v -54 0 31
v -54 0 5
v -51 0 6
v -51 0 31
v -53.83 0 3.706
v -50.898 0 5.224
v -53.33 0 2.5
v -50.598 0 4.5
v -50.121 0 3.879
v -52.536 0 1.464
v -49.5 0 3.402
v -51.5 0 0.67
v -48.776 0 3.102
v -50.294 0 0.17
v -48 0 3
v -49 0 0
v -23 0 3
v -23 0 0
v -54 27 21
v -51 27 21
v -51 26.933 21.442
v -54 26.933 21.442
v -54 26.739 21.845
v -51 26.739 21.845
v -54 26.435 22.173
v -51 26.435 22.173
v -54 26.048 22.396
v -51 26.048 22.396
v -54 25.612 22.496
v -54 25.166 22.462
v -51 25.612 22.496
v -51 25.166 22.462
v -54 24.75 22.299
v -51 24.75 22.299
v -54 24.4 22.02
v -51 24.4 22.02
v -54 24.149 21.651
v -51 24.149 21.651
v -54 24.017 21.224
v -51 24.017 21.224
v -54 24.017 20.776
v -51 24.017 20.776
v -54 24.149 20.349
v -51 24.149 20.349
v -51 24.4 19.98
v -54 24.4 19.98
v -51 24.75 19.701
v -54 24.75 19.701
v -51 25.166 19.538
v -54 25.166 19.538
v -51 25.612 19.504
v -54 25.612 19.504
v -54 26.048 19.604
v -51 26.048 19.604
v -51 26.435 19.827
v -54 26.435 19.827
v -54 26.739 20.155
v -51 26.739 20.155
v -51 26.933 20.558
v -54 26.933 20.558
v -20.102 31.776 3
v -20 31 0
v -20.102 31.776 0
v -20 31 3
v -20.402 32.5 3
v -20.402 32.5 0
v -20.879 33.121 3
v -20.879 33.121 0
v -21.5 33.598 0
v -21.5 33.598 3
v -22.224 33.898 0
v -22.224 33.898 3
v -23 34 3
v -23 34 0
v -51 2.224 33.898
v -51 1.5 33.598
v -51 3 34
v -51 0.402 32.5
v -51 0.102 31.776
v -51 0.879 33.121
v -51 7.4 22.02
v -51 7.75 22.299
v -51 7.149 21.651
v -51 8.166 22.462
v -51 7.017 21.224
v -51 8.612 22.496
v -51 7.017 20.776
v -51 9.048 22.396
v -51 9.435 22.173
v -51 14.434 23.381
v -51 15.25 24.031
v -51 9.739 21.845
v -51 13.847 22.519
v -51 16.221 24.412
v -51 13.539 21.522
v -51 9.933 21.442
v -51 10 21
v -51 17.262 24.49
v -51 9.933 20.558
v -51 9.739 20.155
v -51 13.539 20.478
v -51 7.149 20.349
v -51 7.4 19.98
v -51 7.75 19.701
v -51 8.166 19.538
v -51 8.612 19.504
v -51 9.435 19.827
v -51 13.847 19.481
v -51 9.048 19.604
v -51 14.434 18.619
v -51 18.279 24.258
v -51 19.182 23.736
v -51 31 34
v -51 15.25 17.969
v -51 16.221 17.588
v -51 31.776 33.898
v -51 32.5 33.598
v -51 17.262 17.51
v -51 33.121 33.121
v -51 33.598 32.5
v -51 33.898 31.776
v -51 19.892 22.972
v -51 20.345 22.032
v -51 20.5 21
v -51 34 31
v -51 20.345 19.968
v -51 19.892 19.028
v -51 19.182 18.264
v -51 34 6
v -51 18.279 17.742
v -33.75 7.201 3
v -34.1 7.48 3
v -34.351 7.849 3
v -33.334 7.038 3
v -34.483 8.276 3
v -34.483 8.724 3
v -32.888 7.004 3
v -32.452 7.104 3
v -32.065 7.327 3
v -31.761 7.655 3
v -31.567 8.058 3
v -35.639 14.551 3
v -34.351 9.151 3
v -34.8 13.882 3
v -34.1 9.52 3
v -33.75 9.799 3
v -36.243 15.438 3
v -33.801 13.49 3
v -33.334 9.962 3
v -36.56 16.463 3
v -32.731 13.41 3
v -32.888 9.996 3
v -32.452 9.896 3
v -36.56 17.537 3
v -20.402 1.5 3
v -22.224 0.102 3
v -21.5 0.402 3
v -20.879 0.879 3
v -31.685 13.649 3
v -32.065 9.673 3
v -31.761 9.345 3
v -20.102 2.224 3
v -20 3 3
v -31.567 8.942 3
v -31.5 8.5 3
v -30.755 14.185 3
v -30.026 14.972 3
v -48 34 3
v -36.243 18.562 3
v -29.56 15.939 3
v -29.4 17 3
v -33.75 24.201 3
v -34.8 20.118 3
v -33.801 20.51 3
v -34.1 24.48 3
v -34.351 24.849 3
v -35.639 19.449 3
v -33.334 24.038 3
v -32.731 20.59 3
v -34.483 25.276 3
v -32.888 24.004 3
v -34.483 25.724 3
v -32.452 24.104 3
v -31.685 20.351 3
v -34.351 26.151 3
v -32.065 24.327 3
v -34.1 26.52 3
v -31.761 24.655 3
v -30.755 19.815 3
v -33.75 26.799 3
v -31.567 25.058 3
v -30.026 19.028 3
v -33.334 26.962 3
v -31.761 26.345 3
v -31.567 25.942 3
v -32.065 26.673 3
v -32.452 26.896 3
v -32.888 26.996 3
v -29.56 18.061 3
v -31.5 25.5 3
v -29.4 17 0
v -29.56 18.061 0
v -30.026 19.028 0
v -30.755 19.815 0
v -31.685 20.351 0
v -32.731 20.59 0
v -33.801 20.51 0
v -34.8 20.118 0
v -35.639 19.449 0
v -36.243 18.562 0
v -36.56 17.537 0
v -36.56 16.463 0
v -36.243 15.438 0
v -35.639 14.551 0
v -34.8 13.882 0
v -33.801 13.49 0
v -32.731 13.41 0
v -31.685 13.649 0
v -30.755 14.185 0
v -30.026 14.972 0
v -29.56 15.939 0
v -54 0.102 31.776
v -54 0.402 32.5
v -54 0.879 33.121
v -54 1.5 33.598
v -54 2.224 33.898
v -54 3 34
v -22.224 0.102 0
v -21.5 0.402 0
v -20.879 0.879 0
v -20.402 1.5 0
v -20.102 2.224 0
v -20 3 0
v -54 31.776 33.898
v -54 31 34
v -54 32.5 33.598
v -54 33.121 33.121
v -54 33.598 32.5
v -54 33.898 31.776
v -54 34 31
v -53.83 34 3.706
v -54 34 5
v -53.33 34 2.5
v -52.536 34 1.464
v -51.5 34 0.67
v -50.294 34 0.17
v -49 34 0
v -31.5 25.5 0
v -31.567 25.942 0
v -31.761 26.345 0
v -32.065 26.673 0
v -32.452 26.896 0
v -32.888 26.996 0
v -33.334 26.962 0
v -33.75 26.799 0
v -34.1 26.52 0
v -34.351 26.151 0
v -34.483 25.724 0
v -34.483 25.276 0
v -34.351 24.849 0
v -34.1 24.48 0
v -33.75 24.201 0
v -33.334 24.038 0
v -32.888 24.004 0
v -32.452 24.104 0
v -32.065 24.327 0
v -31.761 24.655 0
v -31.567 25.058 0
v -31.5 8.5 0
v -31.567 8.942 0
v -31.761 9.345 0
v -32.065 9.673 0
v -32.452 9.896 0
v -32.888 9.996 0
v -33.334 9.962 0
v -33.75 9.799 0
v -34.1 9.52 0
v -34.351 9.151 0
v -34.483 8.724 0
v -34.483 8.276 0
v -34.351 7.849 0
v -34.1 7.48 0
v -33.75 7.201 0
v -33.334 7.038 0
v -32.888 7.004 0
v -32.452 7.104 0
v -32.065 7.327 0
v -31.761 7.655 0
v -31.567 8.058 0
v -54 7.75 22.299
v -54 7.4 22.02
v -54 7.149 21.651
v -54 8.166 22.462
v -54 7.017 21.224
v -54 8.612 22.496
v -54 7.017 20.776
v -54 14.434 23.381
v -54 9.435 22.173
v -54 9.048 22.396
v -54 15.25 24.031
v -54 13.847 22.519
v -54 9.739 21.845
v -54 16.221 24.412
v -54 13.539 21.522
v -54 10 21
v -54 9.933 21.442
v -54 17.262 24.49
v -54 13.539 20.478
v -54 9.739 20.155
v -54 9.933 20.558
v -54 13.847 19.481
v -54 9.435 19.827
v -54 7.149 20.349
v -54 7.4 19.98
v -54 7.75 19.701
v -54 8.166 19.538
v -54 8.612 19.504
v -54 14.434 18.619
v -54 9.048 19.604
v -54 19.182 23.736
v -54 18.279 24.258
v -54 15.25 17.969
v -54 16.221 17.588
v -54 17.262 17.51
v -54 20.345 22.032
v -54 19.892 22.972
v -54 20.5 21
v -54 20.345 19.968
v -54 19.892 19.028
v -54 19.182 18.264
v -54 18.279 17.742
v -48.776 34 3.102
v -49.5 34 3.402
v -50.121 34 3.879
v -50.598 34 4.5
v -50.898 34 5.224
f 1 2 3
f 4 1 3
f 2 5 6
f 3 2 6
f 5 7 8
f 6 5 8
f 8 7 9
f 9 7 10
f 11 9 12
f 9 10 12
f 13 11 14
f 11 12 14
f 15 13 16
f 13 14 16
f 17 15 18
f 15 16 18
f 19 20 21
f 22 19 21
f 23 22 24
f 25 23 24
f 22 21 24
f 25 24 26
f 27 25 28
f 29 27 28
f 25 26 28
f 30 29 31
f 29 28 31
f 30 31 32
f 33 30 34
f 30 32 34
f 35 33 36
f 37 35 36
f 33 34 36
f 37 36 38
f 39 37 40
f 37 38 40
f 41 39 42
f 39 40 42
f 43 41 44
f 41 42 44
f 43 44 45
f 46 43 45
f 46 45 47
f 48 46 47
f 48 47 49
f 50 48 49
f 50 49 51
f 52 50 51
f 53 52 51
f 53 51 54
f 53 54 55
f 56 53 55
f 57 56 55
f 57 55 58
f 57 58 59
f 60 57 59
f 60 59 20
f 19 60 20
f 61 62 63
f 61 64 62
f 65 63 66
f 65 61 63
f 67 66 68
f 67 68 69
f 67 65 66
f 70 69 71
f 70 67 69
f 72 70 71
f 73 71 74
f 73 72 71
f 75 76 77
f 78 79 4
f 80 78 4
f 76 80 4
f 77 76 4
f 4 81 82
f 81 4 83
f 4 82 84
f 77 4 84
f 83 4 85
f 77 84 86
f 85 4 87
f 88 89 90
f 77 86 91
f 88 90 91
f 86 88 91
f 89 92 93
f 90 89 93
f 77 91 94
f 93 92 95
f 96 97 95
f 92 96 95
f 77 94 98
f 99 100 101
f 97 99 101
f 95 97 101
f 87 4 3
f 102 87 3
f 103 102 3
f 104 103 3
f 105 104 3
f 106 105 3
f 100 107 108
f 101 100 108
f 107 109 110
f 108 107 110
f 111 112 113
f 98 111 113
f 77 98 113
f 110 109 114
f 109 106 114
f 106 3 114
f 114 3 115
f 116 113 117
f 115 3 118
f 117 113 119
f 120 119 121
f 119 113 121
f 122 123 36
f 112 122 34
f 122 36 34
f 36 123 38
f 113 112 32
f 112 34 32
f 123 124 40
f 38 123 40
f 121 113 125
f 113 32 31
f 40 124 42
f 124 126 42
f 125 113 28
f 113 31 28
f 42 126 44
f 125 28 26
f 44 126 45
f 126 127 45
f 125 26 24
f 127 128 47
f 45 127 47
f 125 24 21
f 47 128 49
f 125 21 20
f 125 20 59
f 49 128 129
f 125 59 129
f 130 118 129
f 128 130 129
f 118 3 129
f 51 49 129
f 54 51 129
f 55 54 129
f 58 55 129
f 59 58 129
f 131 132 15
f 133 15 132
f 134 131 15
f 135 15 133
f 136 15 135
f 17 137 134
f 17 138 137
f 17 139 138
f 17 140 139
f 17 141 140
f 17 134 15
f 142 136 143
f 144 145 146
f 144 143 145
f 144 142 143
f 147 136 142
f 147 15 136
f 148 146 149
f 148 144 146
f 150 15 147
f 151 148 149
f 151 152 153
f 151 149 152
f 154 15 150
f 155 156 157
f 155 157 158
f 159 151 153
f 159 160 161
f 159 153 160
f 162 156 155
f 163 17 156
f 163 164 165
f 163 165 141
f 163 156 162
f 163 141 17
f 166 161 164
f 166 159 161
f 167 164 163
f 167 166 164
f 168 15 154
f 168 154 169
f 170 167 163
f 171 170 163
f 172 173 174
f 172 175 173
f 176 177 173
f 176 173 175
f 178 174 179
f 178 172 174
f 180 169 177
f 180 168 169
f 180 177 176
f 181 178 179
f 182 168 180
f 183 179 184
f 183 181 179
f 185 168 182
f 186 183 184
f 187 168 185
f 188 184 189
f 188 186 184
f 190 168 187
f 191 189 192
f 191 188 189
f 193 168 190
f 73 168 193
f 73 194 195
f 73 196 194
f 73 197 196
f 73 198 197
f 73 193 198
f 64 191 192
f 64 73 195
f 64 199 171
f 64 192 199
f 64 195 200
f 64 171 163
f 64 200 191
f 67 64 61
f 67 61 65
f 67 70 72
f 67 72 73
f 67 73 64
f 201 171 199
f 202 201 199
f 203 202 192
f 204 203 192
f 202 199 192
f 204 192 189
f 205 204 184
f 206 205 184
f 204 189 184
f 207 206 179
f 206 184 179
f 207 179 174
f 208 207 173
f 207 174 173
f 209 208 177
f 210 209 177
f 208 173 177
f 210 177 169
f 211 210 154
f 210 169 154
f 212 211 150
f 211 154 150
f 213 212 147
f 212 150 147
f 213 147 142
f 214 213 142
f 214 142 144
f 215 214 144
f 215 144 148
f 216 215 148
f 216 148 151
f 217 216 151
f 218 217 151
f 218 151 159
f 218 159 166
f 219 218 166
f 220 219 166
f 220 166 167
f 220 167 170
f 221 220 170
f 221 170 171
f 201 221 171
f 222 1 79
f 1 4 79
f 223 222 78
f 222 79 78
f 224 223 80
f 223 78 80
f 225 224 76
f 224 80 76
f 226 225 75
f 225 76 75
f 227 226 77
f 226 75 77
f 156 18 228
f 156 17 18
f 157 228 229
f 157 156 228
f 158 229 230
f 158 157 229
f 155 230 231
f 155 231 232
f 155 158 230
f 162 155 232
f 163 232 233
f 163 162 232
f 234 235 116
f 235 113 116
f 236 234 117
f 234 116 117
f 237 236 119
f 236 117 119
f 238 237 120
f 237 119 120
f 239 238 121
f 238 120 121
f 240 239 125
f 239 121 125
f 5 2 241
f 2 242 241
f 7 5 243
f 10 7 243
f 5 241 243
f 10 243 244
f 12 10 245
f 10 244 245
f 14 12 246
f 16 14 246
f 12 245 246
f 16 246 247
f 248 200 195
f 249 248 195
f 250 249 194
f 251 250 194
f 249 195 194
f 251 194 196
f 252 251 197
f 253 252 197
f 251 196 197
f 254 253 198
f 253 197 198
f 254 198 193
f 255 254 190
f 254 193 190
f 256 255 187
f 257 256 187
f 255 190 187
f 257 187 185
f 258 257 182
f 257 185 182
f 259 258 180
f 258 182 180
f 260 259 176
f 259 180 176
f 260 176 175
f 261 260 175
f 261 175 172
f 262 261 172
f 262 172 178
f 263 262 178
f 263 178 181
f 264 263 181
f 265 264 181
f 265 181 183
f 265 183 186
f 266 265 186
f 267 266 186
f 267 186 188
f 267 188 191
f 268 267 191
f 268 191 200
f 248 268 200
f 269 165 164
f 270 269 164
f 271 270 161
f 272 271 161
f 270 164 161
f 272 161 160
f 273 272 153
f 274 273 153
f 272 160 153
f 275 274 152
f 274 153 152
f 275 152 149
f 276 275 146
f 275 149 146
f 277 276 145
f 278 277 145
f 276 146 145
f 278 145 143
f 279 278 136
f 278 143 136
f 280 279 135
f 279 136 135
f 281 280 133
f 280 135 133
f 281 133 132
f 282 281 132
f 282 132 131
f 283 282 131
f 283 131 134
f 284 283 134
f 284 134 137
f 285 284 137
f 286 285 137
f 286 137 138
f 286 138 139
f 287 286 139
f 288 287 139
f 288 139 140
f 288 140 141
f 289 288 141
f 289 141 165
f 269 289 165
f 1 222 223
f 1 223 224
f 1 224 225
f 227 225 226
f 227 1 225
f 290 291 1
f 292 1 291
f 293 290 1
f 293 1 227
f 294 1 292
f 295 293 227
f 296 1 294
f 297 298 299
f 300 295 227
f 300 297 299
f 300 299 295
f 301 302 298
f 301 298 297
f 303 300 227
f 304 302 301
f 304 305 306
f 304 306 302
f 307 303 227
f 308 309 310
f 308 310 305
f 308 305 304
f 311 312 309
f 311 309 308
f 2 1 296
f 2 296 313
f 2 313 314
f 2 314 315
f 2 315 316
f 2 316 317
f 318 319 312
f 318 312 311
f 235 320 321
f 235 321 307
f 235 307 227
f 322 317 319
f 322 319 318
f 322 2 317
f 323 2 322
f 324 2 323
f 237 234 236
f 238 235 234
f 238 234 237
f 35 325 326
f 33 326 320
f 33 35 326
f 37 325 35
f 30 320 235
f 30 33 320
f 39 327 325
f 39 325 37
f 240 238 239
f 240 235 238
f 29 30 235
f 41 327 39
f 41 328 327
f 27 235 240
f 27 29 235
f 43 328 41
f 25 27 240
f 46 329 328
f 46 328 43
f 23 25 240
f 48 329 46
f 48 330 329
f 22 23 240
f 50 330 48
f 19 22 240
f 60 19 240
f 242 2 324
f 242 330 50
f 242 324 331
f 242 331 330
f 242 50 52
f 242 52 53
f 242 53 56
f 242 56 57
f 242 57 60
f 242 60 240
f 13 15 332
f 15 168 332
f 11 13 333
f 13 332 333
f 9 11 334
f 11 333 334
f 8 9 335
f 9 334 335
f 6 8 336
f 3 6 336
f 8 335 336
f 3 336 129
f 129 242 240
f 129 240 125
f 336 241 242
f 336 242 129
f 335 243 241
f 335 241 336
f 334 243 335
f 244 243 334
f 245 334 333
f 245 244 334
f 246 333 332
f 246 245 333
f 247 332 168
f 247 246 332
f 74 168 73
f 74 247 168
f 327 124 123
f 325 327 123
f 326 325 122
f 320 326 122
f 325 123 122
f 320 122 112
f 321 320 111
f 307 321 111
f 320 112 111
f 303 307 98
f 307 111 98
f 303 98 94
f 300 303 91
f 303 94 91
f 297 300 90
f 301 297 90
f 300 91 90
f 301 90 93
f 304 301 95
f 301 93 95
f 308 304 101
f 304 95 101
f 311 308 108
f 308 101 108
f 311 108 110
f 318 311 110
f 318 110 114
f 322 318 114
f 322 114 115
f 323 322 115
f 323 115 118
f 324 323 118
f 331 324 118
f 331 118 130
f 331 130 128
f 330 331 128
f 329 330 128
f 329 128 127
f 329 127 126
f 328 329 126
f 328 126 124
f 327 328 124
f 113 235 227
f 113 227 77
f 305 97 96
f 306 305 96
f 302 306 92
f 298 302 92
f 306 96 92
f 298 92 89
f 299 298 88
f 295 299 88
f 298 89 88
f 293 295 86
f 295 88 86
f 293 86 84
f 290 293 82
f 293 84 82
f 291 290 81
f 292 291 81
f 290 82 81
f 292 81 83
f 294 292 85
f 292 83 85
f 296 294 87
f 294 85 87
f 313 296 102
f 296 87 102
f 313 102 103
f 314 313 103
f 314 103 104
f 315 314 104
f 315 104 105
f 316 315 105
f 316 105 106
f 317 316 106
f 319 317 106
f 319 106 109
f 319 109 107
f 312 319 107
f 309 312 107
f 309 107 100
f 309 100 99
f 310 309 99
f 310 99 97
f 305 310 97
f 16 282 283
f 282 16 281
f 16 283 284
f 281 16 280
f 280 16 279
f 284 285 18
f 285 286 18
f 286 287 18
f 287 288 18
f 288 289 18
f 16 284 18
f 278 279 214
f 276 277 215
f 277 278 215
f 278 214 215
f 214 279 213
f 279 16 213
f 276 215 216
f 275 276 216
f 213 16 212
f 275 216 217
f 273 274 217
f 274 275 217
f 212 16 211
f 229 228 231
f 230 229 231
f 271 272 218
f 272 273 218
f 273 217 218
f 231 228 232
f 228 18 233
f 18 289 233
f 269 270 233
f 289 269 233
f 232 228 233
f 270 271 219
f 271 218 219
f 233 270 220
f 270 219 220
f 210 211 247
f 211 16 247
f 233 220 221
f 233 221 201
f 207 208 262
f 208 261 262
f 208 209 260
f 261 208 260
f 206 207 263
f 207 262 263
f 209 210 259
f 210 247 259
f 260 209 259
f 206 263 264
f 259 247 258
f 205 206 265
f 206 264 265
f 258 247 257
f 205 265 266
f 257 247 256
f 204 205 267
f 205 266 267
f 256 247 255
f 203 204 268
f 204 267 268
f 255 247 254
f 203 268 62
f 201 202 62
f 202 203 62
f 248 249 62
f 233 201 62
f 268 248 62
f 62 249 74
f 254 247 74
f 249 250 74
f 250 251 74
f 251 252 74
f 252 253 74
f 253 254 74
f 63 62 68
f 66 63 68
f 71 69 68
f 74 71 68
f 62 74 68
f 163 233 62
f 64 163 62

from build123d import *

# Parameters (mm, degrees)
SKETCH005_W     = 34
SKETCH005_H     = 34
PAD005_DEPTH    = 3
SKETCH006_W     = 3
SKETCH006_H     = 34
PAD006_DEPTH    = 31
FILLET_R        = 3
FILLET001_R     = 5
SKETCH007_R     = 1.5
SKETCH007_R_2   = 3.6
POCKET_DEPTH    = 5
FILLET002_R     = 3
SKETCH008_R     = 1.5
SKETCH008_R_2   = 3.5
POCKET001_DEPTH = 5
FILLET003_R     = 3


with BuildPart() as part:
    # Sketch005 → Pad005 (new body)
    with BuildSketch(Plane.XY):
        with Locations((-37, 17)):
            Rectangle(SKETCH005_W, SKETCH005_H)
    extrude(amount=PAD005_DEPTH)

    # Sketch006 (on Face6 of Pad005) → Pad006 (join)
    with BuildSketch(Plane.XY.offset(3)):
        with Locations((-52.5, 17)):
            Rectangle(SKETCH006_W, SKETCH006_H)
    extrude(amount=PAD006_DEPTH)

    # Fillet
    fillet_edges = [part.edges().sort_by_distance(p)[0] for p in [
        (-51, 17, 3),
    ]]
    fillet(fillet_edges, radius=FILLET_R)

    # Fillet001
    fillet001_edges = [part.edges().sort_by_distance(p)[0] for p in [
        (-54, 17, 0),
    ]]
    fillet(fillet001_edges, radius=FILLET001_R)

    # Sketch007 (on Face6 of Fillet001) → Pocket (cut)
    with BuildSketch(Plane.XY.offset(3)):
        with Locations((-33, 8.5)):
            Circle(SKETCH007_R)
        with Locations((-33, 25.5)):
            Circle(SKETCH007_R)
        with Locations((-33, 17)):
            Circle(SKETCH007_R_2)
    extrude(amount=-POCKET_DEPTH, mode=Mode.SUBTRACT)

    # Fillet002
    fillet002_edges = [part.edges().sort_by_distance(p)[0] for p in [
        (-20, 34, 1.5),
        (-20, 0, 1.5),
    ]]
    fillet(fillet002_edges, radius=FILLET002_R)

    # Sketch008 (on Face9 of Fillet002) → Pocket001 (cut)
    with BuildSketch(Plane.YZ.offset(-51)):
        with Locations((8.5, 21)):
            Circle(SKETCH008_R)
        with Locations((25.5, 21)):
            Circle(SKETCH008_R)
        with Locations((17, 21)):
            Circle(SKETCH008_R_2)
    extrude(amount=-POCKET001_DEPTH, mode=Mode.SUBTRACT)

    # Fillet003
    fillet003_edges = [part.edges().sort_by_distance(p)[0] for p in [
        (-52.5, 34, 34),
        (-52.5, 0, 34),
    ]]
    fillet(fillet003_edges, radius=FILLET003_R)


solid = part.part
